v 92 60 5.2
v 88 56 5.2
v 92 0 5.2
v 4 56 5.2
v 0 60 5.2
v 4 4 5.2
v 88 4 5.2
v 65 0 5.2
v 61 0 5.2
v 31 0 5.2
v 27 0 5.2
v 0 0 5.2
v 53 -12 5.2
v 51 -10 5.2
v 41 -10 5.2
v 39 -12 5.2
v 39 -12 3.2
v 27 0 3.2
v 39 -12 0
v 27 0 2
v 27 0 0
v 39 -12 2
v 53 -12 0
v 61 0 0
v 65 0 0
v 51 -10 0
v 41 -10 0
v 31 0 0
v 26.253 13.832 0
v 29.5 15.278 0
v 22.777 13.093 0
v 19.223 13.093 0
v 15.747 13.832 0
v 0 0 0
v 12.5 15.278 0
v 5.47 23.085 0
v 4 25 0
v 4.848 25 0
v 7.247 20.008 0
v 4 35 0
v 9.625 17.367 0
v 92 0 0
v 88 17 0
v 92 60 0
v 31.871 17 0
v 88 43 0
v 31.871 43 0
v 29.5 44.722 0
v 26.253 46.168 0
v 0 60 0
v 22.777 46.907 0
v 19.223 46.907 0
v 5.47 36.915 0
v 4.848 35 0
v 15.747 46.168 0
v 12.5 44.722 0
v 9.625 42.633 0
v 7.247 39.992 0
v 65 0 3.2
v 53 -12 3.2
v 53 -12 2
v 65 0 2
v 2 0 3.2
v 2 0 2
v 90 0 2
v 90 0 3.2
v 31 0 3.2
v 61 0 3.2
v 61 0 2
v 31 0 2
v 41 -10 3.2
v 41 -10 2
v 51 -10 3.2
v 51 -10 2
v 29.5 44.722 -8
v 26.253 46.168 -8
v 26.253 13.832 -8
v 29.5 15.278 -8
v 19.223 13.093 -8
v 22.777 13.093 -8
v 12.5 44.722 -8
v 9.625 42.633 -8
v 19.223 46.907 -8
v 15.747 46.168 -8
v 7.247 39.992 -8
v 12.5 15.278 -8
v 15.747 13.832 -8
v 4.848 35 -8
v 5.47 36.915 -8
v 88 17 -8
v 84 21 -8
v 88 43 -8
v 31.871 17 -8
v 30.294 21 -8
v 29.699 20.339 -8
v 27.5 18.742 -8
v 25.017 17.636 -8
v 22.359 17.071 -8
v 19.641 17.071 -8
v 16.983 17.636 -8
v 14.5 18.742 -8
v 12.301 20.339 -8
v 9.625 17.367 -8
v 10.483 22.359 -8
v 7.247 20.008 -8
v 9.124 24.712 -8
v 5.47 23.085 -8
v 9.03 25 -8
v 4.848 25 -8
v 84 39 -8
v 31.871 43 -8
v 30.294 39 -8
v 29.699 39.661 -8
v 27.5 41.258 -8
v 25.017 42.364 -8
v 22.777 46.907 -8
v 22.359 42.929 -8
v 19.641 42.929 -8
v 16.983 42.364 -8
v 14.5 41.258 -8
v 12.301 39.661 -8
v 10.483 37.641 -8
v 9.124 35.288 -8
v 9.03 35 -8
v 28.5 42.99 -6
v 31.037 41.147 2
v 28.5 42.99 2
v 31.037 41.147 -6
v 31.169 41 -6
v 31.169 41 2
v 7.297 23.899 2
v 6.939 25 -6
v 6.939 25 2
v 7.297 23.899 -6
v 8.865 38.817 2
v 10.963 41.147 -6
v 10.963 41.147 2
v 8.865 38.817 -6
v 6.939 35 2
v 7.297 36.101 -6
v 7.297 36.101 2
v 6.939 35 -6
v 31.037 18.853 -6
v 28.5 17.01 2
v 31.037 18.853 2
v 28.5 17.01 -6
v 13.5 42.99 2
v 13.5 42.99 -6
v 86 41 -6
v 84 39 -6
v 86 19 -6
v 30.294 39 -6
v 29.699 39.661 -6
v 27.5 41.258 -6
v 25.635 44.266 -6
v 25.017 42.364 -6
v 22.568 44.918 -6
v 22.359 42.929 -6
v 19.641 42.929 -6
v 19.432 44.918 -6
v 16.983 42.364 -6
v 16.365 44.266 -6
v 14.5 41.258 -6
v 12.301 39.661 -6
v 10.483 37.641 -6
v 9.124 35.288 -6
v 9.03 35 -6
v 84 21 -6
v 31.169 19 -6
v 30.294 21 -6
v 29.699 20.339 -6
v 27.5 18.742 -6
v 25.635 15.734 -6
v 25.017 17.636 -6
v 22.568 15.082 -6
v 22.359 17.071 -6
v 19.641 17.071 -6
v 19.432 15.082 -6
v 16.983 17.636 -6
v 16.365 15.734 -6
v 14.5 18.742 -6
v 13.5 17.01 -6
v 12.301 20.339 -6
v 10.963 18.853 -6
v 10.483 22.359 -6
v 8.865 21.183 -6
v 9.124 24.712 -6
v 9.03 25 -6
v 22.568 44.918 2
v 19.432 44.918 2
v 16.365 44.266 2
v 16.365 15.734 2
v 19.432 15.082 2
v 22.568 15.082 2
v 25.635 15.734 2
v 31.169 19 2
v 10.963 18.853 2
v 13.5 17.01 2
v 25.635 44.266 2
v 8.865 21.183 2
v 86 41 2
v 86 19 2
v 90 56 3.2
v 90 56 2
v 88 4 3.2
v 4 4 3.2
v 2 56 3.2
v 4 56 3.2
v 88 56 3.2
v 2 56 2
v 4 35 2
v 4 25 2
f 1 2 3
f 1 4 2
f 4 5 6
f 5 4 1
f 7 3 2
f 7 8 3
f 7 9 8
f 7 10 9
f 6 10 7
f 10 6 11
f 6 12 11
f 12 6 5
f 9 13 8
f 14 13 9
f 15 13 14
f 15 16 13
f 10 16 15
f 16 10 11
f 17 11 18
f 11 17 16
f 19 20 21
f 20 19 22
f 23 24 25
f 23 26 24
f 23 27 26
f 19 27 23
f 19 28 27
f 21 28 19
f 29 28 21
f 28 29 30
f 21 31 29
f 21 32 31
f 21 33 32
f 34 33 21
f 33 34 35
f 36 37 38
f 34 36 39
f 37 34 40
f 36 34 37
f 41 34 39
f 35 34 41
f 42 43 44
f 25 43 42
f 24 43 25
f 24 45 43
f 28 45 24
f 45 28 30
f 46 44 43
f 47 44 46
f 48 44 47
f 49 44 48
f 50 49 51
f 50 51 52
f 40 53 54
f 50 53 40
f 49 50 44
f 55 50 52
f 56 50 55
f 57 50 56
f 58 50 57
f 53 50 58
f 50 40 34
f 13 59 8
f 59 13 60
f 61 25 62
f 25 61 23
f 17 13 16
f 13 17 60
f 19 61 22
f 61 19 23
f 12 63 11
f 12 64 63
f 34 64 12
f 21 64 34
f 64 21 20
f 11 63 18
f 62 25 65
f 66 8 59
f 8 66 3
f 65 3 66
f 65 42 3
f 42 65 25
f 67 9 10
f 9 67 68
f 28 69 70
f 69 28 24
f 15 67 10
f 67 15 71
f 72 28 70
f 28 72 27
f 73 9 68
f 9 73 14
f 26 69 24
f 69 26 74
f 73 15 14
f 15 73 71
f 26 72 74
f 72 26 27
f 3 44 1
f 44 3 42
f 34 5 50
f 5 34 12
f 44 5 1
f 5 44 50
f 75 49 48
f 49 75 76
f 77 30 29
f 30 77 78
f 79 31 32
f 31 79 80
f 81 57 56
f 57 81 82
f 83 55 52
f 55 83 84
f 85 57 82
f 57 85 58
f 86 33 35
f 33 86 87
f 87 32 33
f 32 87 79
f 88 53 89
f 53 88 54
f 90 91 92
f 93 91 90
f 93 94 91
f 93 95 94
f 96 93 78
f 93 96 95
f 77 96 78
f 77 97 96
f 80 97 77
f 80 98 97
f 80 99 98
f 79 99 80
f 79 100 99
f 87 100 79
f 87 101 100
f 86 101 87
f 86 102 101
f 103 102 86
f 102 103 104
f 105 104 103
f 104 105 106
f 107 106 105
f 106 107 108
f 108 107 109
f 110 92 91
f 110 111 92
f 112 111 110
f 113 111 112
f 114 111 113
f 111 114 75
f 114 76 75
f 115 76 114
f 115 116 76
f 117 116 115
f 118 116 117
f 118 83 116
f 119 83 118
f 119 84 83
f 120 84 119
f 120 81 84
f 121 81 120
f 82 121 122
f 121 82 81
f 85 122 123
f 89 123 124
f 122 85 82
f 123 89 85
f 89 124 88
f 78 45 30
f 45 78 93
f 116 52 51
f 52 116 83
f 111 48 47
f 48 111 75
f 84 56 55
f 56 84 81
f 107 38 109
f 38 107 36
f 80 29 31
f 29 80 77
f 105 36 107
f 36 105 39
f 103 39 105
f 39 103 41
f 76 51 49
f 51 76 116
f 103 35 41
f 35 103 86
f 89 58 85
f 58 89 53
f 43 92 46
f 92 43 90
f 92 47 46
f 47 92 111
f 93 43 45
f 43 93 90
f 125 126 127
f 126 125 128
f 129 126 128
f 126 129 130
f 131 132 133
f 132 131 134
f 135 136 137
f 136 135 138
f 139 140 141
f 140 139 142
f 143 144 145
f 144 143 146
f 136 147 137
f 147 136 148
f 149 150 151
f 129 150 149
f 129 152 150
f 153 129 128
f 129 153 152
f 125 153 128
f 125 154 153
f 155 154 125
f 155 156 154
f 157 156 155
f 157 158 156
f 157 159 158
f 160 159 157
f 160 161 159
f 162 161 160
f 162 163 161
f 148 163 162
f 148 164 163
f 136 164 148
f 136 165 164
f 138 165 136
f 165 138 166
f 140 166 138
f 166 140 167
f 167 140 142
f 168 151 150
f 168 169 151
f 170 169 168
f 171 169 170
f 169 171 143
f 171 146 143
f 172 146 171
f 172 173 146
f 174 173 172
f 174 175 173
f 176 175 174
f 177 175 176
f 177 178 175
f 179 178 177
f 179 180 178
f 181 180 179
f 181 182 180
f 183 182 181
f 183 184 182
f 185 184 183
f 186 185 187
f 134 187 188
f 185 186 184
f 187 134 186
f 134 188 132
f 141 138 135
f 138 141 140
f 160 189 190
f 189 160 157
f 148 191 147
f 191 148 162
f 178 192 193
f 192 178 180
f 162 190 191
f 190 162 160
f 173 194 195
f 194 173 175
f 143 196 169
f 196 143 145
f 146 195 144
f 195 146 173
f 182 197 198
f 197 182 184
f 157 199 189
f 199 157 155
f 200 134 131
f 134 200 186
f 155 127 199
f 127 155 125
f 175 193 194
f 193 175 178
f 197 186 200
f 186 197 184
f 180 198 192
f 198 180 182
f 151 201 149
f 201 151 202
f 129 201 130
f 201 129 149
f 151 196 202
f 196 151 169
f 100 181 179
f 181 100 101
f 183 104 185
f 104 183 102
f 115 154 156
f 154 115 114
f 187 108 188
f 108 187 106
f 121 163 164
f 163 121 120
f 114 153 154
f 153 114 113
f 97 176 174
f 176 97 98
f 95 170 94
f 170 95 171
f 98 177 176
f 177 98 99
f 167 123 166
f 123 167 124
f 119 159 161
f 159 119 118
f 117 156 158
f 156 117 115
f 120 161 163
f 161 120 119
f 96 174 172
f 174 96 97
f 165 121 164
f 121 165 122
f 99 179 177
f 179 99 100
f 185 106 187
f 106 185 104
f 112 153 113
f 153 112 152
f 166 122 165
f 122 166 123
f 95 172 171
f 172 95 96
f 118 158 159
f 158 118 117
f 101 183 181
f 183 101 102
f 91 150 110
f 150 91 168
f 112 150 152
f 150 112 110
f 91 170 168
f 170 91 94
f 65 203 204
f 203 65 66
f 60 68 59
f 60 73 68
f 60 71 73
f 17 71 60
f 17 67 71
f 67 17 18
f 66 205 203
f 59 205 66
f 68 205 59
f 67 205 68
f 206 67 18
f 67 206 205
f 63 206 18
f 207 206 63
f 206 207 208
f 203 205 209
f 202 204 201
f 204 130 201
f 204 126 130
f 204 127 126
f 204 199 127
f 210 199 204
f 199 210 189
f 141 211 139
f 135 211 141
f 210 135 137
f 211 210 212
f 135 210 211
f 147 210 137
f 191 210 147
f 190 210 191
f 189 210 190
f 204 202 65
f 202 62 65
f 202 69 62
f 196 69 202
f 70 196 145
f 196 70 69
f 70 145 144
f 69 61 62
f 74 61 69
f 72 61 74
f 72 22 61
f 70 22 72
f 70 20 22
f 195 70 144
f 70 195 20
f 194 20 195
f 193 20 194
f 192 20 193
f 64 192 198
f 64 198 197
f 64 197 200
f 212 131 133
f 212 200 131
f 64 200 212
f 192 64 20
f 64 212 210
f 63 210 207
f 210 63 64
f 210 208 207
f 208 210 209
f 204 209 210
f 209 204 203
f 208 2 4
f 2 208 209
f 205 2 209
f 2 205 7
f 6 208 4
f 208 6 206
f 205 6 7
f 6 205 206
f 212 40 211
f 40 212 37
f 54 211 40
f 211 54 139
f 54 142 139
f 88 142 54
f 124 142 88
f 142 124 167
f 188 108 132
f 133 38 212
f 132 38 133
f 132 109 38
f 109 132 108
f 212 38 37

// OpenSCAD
module clip(wall,x,y,z){
	module trap(x,y,z){//trapezoid
		module trap_edge(mv,x,y,z){
			translate([mv,0,0])
			rotate([0,0,45])
			cube([x,y,z]);
		}
		difference(){
			translate([-x,0,0])
			cube([x*2,y,z]);
			union(){ //make shape
				trap_edge( x,x*2,y*2,z);
				trap_edge(-x,x*2,y*2,z);
			};
		};
	};
	difference(){
    trap(x+wall*2,y+wall,z);
    trap(x,y,z);
    };
};

module card (x,y,z){ //ID card for holder
	cube([x,y,z]);
};


module RSA(bulb_dia,total_length,height,end_dia){
//wierd RSA bulb shape translate([bulb_dia/2,0,height/2])
	union(){
		cylinder(d=bulb_dia,h=height,center=true);
		translate([(total_length-bulb_dia/2)/2,0,0])
	//may need to change end 2 around
		cube([total_length-bulb_dia/2,end_dia,height],true);
	};
};

module card_handles(x,y,z,clip_len,clip_height,clip_wall){
	union(){
		cube([x,y,z]);
		translate([x/2,y/2,0])
        //i=[0:1] for a holder on both sides
		for(i=[1:1])rotate([0,0,180*i])translate([0,y/2,0])
			clip(clip_wall,clip_len,clip_height,z);
	};
}


module RSA_holder(rsa_bulb,rsa_len,rsa_height,rsa_width,wall){
	translate([rsa_bulb/2 + wall, rsa_bulb/2 + wall,(rsa_height+wall)/2])//de-center
	difference(){
		RSA(rsa_bulb+wall*2,rsa_len+wall*2,rsa_height,rsa_width+wall*2);
		union(){
			translate([0,0,-wall])
			RSA(rsa_bulb       ,rsa_len     ,rsa_height  ,rsa_width);
			translate([0, 0,wall])
			RSA(rsa_bulb-wall*2,rsa_len-wall*2,rsa_height,rsa_width-wall*2);
		};
	};
};


module card_cutout(x,y,z,wall){
 union(){
		card(x,y,z);
		translate([wall,wall,wall])
		card(x-wall*2,y-wall*2,wall+z);
	};
};


module handle_cutout(x,y,z,midspace){
	union(){
		for(i=[0:1])rotate([0,180*i,0])translate([midspace/2,0,0])
			cube([x,y,z]);
	};
};


module holder(wall,
	card_x, card_y, card_z,
	clip_len,clip_height,
	rsa_bulb,rsa_len,rsa_height,rsa_width,
    rsa_cutout_len,rsa_cutout_width){

	RSA_correction = [(card_x-rsa_len)/2,(card_y-rsa_bulb)/2,wall];
        
	difference(){
		union(){
			translate([0,0,0])
			card_handles(card_x+wall*2,card_y+wall*2, card_z+wall*2, clip_len,clip_height,wall);
			translate(RSA_correction)mirror([0,0,1])RSA_holder(rsa_bulb,rsa_len,rsa_height,rsa_width,wall);
		}
	//cutout portion
		union(){
			translate([wall,-wall*50,wall])
				card(card_x,card_y+wall*50,card_z);
			translate([wall*2,wall*2,wall])
				card(card_x-wall*2,card_y-wall*2,wall+card_z);
			translate([rsa_bulb/2 + wall, rsa_bulb/2 + wall,0])//de-centre
			translate(RSA_correction)RSA(rsa_bulb,rsa_len,rsa_height,rsa_width);
            //Cutout for RSA token lanyard connector
            translate(RSA_correction)
            translate([0,rsa_bulb/2+wall - rsa_cutout_width/2,-(        rsa_height+2*wall)])
            cube([rsa_cutout_len,rsa_cutout_width,rsa_height+2*wall]);

		};
	};
};

holder(
	2,//wall thickness
	88, 56 ,1.2 ,//card size
    15, 10,         //size of tabs
	30, 80 ,9  ,22,//rsa bulb
    10, 10 //cutout for RSA lanyard attachment point
	);
